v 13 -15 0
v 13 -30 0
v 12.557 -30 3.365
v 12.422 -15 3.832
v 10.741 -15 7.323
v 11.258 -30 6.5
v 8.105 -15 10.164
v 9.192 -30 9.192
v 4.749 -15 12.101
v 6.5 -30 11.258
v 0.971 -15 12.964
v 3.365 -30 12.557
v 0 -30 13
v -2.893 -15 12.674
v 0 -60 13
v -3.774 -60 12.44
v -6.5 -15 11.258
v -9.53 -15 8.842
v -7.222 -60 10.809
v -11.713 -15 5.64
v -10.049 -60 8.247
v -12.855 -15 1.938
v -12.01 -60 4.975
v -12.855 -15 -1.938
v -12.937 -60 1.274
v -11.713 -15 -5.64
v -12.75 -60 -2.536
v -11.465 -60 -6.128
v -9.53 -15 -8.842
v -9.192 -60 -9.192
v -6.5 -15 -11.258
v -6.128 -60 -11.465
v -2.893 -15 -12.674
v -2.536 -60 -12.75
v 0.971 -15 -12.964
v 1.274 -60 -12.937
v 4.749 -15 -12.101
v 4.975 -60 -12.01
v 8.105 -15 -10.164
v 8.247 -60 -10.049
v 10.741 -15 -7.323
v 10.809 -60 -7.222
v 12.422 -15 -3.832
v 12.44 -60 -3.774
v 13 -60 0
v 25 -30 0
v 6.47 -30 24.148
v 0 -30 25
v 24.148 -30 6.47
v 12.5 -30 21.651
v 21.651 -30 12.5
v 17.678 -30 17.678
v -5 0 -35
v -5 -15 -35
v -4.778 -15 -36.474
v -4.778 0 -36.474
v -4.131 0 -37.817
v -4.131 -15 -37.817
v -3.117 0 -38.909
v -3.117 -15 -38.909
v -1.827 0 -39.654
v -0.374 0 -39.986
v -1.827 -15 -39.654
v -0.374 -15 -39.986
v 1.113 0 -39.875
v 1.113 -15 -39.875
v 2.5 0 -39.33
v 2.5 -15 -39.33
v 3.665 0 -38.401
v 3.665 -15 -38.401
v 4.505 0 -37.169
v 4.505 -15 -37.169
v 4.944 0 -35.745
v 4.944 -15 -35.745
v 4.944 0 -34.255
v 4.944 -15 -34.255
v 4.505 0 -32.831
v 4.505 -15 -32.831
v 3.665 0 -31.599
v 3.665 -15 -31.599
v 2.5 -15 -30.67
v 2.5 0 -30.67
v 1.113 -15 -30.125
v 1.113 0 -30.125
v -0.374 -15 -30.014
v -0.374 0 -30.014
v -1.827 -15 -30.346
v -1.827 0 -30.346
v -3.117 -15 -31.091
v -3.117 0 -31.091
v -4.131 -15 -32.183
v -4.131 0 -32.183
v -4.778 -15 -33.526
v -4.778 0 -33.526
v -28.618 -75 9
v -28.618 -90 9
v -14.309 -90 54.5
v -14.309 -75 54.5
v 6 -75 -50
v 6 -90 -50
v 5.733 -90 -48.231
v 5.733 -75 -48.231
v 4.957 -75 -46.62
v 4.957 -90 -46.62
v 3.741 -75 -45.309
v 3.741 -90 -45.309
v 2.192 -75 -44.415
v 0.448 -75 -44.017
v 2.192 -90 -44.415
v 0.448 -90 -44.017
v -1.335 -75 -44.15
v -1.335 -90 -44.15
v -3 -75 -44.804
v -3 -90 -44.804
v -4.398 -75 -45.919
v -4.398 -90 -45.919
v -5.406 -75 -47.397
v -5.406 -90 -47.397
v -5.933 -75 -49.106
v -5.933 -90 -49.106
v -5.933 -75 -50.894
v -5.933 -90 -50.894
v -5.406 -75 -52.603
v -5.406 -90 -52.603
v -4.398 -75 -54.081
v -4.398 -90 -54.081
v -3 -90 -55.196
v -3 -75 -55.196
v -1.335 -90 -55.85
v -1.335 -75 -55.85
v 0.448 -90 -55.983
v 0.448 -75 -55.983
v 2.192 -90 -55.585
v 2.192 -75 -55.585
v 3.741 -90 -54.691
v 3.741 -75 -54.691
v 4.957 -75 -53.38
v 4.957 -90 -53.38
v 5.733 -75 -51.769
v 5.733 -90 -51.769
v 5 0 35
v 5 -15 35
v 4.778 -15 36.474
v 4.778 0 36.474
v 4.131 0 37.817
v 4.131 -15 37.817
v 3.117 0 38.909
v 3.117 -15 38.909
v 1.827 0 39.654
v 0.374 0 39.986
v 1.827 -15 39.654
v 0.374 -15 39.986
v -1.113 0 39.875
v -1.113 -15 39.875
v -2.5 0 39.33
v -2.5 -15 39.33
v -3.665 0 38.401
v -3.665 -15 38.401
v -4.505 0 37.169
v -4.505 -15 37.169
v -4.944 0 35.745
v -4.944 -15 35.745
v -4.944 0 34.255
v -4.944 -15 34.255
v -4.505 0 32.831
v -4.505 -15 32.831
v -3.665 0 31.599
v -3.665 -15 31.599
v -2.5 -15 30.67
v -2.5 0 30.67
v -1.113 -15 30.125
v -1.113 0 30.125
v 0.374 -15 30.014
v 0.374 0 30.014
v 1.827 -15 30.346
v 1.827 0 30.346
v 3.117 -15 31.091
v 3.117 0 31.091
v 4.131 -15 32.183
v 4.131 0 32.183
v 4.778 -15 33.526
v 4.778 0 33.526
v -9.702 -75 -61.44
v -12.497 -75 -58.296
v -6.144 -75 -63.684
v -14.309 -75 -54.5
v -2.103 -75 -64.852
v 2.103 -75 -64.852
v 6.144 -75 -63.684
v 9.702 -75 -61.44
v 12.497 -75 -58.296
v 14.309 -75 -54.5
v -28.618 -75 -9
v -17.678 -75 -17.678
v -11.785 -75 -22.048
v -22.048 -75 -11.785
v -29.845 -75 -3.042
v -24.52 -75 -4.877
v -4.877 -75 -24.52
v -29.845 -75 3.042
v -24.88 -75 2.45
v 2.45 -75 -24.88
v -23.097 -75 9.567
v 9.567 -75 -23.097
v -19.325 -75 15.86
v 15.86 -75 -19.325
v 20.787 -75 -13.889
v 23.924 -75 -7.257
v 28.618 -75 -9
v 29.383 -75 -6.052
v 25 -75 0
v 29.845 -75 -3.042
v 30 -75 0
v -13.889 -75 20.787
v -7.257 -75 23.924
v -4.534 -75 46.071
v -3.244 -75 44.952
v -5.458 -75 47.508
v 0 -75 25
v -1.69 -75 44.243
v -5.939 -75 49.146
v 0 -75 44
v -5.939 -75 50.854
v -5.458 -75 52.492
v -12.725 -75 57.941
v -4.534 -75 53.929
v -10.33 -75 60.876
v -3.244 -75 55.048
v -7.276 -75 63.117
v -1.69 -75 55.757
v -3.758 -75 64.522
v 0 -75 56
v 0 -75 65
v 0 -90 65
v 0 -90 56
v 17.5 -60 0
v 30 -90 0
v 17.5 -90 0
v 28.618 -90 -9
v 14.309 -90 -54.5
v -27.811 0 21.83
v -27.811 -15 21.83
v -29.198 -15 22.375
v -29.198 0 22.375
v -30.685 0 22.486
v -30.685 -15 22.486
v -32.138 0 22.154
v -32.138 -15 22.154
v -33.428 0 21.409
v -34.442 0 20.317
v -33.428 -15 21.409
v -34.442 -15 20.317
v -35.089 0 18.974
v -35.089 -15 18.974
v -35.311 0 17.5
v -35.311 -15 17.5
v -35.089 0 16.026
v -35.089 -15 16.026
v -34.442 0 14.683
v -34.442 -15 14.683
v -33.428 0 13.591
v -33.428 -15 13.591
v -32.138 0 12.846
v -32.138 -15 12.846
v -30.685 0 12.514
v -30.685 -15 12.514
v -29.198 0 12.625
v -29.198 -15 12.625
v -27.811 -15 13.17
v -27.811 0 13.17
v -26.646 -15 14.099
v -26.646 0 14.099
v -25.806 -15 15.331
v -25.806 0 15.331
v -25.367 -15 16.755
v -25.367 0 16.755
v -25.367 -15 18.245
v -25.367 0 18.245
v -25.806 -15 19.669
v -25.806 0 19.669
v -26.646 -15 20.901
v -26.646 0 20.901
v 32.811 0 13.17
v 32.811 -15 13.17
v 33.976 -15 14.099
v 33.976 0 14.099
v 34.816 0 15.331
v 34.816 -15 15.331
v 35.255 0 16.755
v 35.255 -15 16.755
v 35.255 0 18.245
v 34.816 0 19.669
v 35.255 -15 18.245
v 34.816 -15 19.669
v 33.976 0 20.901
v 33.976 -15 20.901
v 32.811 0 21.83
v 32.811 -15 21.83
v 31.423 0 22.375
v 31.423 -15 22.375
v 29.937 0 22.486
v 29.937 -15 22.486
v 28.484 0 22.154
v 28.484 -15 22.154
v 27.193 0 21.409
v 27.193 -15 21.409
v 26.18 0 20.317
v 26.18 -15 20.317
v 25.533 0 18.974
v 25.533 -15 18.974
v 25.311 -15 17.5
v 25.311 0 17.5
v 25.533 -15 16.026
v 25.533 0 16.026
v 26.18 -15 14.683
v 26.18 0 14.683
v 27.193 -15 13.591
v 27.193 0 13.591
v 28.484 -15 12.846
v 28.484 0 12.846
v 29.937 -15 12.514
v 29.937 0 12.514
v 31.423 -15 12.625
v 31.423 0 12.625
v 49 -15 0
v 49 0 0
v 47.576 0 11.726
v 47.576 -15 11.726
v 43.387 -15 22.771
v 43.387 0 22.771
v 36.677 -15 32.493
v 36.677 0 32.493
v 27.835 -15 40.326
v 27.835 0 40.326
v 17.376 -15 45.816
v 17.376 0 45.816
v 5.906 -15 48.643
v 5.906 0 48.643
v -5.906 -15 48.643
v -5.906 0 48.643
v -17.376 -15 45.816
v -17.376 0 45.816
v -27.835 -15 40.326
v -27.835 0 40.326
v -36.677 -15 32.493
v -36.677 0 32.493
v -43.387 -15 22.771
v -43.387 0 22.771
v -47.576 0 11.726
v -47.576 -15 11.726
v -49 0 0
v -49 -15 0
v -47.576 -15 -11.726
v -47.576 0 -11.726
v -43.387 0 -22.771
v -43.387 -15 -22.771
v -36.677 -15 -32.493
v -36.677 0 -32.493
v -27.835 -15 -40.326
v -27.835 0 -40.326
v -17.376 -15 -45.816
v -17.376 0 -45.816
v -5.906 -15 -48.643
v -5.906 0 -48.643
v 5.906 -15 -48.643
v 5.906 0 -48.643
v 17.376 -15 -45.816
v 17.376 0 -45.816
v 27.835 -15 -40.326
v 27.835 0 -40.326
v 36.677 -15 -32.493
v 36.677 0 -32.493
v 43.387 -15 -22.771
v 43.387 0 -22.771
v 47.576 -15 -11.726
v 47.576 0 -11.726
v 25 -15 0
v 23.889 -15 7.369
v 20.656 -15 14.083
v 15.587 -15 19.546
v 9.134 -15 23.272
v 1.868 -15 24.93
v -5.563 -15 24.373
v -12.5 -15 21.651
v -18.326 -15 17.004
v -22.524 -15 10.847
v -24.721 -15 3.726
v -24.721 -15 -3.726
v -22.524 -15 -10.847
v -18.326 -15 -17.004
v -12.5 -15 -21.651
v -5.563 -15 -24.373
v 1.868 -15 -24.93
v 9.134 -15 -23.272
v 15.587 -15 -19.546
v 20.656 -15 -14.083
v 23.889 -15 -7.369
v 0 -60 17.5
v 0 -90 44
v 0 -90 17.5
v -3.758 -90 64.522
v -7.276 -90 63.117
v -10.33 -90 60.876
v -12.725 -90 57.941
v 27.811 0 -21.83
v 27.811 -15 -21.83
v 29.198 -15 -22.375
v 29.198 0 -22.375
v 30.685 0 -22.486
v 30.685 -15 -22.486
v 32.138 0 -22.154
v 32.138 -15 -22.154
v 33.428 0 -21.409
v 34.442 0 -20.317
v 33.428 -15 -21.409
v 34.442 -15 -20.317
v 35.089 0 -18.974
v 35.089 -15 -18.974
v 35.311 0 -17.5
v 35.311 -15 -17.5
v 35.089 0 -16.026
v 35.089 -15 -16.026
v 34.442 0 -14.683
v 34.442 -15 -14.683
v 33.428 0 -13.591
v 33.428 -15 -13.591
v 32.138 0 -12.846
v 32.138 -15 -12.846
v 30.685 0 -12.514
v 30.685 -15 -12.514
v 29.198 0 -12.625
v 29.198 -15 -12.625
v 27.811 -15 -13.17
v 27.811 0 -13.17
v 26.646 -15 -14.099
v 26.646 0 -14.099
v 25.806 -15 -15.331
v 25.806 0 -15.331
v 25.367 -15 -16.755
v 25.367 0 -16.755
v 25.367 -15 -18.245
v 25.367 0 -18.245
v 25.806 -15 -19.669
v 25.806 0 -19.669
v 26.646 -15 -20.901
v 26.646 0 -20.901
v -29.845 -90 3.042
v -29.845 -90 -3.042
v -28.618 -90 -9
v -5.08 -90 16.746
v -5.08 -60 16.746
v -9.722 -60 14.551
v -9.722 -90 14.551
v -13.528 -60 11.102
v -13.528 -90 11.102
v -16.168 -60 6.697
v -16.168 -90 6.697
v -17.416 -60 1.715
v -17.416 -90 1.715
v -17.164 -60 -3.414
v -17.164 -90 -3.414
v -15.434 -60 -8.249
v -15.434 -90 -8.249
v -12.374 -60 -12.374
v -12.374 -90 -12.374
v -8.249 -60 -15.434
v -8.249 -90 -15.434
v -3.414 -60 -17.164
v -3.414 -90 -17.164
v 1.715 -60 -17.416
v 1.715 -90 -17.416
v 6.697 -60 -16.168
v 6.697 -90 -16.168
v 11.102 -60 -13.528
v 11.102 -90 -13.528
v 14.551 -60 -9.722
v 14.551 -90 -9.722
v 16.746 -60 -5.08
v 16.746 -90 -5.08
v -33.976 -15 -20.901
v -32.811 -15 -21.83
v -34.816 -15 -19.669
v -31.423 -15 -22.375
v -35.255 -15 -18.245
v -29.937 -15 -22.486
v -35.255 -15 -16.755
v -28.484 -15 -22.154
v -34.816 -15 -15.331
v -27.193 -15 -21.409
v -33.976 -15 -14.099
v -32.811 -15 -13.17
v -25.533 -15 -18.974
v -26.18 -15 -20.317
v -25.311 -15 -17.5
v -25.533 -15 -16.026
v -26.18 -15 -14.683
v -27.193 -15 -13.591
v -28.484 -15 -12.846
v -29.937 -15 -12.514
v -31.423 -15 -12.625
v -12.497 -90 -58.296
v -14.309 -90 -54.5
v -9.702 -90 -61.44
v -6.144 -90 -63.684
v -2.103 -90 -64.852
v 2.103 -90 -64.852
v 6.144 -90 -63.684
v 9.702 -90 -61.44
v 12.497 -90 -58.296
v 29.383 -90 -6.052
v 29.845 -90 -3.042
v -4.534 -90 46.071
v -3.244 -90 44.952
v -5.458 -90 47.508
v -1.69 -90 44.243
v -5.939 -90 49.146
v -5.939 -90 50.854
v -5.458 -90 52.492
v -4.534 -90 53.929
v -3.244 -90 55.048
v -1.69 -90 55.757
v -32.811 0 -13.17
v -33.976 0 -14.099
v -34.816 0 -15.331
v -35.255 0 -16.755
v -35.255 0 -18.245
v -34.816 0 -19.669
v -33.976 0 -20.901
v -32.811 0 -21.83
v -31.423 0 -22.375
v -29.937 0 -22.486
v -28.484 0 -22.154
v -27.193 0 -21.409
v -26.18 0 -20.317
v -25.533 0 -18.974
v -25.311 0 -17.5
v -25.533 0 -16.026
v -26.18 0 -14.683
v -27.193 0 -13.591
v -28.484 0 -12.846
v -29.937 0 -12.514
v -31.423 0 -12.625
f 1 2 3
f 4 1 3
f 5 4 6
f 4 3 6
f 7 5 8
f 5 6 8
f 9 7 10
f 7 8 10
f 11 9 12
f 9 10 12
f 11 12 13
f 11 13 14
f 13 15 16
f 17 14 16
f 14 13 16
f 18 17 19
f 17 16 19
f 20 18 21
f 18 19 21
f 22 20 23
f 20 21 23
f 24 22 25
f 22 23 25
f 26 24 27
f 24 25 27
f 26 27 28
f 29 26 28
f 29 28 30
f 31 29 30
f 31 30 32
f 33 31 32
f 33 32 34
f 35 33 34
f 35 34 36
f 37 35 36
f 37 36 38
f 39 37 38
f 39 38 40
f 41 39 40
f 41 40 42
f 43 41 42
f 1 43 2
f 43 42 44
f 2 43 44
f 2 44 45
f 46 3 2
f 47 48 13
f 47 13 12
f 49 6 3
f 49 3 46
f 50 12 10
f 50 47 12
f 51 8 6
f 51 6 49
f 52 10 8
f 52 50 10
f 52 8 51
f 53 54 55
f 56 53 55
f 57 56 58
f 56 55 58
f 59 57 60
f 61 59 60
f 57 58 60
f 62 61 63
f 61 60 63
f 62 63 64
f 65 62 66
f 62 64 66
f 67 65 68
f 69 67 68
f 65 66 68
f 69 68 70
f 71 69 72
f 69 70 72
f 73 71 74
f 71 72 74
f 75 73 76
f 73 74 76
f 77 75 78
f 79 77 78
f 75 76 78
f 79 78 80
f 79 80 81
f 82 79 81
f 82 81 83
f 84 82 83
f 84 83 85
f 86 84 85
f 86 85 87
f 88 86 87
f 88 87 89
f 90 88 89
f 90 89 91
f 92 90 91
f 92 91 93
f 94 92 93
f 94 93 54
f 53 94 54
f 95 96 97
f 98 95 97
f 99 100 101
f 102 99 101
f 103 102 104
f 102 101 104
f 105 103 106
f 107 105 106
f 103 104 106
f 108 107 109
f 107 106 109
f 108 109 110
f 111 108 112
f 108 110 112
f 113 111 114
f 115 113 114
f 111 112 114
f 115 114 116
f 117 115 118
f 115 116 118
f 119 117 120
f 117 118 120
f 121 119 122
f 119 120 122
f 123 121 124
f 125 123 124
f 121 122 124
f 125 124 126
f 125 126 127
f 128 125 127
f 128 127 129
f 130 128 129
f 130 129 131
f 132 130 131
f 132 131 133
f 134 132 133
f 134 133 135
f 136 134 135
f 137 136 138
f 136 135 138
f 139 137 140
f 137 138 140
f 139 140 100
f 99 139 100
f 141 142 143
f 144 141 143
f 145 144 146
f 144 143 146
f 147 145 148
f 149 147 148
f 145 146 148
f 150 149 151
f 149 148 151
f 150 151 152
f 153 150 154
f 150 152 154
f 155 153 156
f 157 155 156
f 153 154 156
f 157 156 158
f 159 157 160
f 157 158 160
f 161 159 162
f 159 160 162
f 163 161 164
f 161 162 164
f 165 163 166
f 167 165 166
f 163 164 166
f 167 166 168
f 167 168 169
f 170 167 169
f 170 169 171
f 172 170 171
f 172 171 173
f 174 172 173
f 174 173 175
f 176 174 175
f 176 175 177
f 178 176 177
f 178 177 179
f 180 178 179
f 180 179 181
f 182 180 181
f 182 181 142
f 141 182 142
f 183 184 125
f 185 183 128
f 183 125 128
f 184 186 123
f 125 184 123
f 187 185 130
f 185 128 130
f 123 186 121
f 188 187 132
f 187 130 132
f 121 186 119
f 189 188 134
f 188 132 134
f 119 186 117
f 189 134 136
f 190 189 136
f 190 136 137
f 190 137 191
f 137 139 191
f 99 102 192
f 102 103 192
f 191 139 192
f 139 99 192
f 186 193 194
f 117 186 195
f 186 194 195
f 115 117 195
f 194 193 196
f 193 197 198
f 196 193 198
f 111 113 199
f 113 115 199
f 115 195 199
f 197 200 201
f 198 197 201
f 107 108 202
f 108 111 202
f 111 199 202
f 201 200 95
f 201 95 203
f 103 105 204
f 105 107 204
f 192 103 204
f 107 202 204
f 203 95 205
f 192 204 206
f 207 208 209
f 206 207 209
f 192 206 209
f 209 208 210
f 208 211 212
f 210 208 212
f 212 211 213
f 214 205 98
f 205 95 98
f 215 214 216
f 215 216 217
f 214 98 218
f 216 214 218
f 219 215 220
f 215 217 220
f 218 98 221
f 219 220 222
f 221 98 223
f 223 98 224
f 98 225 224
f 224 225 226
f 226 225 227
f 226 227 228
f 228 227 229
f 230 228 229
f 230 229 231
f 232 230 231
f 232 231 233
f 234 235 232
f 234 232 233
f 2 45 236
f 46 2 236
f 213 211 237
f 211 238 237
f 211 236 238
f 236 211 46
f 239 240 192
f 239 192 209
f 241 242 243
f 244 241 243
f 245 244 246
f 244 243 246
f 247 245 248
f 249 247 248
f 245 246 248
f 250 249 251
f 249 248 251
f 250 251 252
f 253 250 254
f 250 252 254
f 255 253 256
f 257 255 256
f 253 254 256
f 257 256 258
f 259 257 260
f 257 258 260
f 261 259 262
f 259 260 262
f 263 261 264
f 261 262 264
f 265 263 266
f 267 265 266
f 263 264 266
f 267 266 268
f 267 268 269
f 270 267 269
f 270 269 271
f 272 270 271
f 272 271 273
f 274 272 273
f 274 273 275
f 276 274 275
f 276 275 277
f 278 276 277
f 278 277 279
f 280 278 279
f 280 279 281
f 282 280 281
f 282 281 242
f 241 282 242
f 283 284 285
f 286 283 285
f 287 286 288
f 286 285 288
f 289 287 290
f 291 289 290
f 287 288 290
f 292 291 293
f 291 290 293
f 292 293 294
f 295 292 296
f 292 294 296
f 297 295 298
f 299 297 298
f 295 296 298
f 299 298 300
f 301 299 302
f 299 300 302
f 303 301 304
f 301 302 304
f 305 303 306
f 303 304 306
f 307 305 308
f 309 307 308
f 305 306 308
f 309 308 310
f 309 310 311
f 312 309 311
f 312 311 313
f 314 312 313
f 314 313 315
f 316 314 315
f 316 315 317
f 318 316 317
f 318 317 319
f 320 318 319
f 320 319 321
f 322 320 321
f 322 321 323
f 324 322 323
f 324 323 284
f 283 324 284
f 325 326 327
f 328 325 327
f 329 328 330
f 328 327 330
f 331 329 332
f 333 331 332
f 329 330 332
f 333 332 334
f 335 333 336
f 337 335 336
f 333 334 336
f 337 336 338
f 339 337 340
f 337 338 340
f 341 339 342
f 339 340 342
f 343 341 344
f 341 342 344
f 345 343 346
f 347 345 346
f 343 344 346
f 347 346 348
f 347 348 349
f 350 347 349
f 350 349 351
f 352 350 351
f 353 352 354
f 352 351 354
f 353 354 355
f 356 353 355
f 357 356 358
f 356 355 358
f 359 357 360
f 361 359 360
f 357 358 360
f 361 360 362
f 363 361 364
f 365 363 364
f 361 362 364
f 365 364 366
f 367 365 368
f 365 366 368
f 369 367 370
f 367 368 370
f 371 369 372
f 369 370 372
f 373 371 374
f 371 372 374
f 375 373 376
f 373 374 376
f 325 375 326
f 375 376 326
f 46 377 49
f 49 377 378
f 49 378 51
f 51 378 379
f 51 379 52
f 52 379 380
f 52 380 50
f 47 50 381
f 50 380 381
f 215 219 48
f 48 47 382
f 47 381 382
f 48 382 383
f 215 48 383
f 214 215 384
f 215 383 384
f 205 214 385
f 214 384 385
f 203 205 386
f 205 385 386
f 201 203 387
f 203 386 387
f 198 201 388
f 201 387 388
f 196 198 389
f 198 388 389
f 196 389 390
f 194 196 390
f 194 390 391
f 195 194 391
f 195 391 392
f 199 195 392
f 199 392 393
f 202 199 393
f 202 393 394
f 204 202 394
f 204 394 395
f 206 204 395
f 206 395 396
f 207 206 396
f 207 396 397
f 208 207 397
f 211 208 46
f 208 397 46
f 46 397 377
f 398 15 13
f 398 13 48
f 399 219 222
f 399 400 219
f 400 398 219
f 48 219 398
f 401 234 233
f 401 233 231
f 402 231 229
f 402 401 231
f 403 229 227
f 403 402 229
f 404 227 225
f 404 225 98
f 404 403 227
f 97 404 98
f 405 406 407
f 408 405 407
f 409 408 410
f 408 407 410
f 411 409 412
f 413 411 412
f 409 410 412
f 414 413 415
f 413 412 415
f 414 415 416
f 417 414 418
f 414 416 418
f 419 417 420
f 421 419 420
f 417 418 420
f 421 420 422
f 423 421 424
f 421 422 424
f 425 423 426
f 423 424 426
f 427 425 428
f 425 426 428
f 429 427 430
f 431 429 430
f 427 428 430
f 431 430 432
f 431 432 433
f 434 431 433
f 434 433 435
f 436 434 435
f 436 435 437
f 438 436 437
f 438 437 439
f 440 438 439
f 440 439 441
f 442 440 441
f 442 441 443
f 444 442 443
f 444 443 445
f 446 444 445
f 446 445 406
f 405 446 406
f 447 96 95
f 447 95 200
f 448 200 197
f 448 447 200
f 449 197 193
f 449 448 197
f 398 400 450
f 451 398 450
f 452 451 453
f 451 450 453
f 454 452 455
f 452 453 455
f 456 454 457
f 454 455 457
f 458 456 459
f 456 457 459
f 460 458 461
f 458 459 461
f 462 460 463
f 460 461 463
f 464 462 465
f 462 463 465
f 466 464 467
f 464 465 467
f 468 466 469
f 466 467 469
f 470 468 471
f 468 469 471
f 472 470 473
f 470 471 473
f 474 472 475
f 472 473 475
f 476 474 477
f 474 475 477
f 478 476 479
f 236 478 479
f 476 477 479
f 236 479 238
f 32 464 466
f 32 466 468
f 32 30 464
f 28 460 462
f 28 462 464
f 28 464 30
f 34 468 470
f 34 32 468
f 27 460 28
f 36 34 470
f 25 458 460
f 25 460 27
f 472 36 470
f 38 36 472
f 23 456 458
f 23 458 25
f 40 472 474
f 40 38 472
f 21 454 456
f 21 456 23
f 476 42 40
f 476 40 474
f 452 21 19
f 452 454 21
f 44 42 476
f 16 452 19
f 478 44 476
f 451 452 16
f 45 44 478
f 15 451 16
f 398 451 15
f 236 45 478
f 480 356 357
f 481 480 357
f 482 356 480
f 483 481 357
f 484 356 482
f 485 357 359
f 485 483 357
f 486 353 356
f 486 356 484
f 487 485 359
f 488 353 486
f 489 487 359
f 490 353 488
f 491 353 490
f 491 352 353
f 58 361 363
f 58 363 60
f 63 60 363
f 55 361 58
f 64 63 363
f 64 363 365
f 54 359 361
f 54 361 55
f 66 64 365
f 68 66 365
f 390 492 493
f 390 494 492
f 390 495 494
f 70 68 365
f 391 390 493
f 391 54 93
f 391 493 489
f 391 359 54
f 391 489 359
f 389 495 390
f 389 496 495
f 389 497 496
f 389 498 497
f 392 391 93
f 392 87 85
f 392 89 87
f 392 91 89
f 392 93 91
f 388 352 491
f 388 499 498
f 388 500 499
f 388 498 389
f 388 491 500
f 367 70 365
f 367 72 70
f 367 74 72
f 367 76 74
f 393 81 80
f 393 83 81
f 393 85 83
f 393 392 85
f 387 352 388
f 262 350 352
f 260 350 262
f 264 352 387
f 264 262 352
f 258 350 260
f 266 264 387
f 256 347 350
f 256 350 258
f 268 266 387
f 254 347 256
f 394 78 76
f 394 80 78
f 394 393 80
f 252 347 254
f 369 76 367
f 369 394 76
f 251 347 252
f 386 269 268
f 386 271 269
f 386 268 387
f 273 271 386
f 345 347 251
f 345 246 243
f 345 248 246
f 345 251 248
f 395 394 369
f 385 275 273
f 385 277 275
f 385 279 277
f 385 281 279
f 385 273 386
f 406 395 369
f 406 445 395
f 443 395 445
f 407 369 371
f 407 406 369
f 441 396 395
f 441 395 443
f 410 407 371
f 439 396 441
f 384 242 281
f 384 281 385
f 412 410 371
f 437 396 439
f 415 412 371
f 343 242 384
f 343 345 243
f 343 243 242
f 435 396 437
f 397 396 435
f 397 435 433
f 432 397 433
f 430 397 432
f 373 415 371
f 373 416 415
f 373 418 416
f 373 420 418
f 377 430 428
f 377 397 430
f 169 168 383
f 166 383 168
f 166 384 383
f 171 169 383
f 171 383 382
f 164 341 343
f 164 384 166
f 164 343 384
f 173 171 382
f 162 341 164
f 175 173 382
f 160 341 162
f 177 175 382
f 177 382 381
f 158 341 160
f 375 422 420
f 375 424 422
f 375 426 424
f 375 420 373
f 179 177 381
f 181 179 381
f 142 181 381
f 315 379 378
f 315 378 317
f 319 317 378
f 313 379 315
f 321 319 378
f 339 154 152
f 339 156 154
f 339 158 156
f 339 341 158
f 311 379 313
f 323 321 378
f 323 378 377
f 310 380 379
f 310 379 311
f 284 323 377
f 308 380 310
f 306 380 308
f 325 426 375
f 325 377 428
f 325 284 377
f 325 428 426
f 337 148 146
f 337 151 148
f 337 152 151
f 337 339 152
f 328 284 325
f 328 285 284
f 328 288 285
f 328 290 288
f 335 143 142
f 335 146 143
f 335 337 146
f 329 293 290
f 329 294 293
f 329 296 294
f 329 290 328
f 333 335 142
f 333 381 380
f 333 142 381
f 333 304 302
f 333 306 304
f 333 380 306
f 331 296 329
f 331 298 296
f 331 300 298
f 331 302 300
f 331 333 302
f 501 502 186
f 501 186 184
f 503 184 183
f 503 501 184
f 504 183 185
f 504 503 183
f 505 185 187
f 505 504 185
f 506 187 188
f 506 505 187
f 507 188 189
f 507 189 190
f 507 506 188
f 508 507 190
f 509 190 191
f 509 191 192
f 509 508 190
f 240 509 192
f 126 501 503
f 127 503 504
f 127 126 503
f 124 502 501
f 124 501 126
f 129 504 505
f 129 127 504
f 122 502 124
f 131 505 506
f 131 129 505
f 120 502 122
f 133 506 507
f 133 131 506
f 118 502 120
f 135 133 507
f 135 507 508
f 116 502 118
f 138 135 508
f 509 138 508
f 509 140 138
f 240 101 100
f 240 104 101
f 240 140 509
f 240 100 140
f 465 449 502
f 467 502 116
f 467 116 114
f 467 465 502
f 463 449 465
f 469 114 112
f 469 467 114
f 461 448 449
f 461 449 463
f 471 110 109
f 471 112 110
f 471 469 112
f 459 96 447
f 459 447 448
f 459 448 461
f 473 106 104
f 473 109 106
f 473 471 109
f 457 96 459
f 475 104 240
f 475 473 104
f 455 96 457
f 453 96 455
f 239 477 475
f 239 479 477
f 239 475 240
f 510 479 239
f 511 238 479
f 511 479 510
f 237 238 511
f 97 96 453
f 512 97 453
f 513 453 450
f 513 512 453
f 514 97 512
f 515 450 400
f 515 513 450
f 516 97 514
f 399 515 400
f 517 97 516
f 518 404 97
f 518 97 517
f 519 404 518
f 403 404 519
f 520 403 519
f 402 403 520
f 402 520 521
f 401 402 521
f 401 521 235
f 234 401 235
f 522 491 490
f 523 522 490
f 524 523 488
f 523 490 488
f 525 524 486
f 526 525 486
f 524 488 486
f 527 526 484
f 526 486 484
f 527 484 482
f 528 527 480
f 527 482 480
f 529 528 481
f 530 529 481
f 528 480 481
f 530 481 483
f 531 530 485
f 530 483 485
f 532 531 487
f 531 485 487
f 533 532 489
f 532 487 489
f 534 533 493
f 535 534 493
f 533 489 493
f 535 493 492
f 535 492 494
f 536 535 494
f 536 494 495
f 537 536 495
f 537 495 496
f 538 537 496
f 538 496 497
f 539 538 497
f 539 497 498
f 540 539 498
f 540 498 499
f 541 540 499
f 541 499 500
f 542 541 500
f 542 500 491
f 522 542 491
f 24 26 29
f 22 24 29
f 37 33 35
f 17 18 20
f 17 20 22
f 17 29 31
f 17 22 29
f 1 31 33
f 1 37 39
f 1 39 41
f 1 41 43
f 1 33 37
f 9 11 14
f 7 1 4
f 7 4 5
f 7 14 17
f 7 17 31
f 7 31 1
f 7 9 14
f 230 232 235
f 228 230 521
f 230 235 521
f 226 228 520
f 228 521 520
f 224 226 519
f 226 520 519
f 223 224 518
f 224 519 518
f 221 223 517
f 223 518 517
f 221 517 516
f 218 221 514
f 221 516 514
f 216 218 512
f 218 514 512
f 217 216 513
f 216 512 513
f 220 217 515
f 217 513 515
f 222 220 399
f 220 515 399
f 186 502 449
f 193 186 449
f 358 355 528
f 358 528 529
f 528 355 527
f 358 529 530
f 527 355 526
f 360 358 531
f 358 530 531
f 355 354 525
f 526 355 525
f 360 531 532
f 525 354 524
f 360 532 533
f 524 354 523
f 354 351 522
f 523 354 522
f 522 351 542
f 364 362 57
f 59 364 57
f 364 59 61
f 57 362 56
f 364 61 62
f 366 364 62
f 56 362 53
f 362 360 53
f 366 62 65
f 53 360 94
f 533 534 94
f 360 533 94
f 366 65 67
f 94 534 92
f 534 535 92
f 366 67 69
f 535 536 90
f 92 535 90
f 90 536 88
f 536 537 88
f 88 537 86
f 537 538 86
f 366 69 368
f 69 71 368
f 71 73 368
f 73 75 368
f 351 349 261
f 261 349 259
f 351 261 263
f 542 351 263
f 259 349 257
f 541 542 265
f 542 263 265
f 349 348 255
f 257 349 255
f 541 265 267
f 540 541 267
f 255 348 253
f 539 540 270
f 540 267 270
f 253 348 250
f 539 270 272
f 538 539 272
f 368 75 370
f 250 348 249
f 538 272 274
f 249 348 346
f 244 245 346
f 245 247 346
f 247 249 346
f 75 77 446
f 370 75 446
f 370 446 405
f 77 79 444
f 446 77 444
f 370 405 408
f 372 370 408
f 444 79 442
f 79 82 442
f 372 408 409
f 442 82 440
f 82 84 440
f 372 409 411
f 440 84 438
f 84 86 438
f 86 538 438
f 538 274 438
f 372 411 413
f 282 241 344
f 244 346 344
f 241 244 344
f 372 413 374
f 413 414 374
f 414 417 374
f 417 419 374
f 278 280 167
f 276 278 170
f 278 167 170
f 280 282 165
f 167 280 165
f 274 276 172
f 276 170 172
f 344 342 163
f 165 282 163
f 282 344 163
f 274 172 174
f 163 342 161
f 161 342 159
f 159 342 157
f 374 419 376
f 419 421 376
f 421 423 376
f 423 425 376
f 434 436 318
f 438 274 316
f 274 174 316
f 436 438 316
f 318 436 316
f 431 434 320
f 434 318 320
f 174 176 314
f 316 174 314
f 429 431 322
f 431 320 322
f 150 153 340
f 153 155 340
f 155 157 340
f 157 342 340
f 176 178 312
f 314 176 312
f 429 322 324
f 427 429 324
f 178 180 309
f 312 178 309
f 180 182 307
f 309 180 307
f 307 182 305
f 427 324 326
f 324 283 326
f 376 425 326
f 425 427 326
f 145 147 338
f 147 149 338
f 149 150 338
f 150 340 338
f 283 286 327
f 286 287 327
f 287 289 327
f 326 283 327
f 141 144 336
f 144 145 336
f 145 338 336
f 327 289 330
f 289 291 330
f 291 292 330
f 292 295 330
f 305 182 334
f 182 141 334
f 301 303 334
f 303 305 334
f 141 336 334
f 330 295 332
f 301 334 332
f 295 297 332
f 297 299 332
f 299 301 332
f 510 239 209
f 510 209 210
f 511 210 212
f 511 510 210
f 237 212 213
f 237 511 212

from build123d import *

# Parameters (mm, degrees)
SKETCH_R           = 49
PAD_DEPTH          = 15
SKETCH001_R        = 5
POCKET_DEPTH       = 293.805591
POLARPATTERN_COUNT = 6
SKETCH002_R        = 25
PAD001_DEPTH       = 75
SKETCH003_R        = 17.5
POCKET001_DEPTH    = 30
SKETCH004_R        = 13
POCKET002_DEPTH    = 45
SKETCH005_R        = 6
SKETCH005_R_2      = 17.5
PAD002_DEPTH       = 15
SKETCH006_W        = 69.832336
SKETCH006_H        = 89.129906
POCKET003_DEPTH    = 60


with BuildPart() as part:
    # Sketch → Pad (new body)
    with BuildSketch(Plane.XZ):
        Circle(SKETCH_R)
    extrude(amount=PAD_DEPTH)

    # Sketch001 → Pocket (cut, through all)
    with BuildSketch(Plane.XZ.offset(15)):
        with Locations((0, 35)):
            Circle(SKETCH001_R)
    pocket = extrude(amount=-POCKET_DEPTH, mode=Mode.SUBTRACT)

    # PolarPattern: Pocket ×6 about axis
    polarpattern_axis = Axis((0, -15, 0), (0, -1, 0))
    for i in range(1, POLARPATTERN_COUNT):
        add(pocket.rotate(polarpattern_axis, i * 360 / POLARPATTERN_COUNT), mode=Mode.SUBTRACT)

    # Sketch002 → Pad001 (new body)
    with BuildSketch(Plane.XZ.offset(15)):
        Circle(SKETCH002_R)
    extrude(amount=PAD001_DEPTH)

    # Sketch003 → Pocket001 (cut)
    with BuildSketch(Plane.XZ.offset(90)):
        Circle(SKETCH003_R)
    extrude(amount=-POCKET001_DEPTH, mode=Mode.SUBTRACT)

    # Sketch004 → Pocket002 (cut)
    with BuildSketch(Plane.XZ.offset(60)):
        Circle(SKETCH004_R)
    extrude(amount=-POCKET002_DEPTH, mode=Mode.SUBTRACT)

    # Sketch005 → Pad002 (new body)
    with BuildSketch(Plane.XZ.offset(90)):
        with BuildLine():
            ThreePointArc((-28.618176, 9), (-30, 0), (-28.618176, -9))
            Line((-14.309088, -54.5), (-28.618176, -9))
            ThreePointArc((-14.309088, -54.5), (8e-06, -65), (14.309093, -54.499985))
            Line((14.309093, -54.499985), (28.618176, -9.000001))
            ThreePointArc((28.618176, -9.000001), (30, 0), (28.618176, 9))
            Line((14.309078, 54.50003), (28.618176, 9))
            ThreePointArc((14.309078, 54.50003), (-1.6e-05, 65), (-14.309088, 54.5))
            Line((-28.618176, 9), (-14.309088, 54.5))
        make_face()
        with Locations((0, 50)):
            Circle(SKETCH005_R, mode=Mode.SUBTRACT)
        with Locations((0, -50)):
            Circle(SKETCH005_R, mode=Mode.SUBTRACT)
        Circle(SKETCH005_R_2, mode=Mode.SUBTRACT)
    extrude(amount=-PAD002_DEPTH)

    # Sketch006 → Pocket003 (cut)
    with BuildSketch(Plane.XZ.offset(90)):
        with Locations((34.916168, 44.564953)):
            Rectangle(SKETCH006_W, SKETCH006_H)
    extrude(amount=-POCKET003_DEPTH, mode=Mode.SUBTRACT)


solid = part.part
